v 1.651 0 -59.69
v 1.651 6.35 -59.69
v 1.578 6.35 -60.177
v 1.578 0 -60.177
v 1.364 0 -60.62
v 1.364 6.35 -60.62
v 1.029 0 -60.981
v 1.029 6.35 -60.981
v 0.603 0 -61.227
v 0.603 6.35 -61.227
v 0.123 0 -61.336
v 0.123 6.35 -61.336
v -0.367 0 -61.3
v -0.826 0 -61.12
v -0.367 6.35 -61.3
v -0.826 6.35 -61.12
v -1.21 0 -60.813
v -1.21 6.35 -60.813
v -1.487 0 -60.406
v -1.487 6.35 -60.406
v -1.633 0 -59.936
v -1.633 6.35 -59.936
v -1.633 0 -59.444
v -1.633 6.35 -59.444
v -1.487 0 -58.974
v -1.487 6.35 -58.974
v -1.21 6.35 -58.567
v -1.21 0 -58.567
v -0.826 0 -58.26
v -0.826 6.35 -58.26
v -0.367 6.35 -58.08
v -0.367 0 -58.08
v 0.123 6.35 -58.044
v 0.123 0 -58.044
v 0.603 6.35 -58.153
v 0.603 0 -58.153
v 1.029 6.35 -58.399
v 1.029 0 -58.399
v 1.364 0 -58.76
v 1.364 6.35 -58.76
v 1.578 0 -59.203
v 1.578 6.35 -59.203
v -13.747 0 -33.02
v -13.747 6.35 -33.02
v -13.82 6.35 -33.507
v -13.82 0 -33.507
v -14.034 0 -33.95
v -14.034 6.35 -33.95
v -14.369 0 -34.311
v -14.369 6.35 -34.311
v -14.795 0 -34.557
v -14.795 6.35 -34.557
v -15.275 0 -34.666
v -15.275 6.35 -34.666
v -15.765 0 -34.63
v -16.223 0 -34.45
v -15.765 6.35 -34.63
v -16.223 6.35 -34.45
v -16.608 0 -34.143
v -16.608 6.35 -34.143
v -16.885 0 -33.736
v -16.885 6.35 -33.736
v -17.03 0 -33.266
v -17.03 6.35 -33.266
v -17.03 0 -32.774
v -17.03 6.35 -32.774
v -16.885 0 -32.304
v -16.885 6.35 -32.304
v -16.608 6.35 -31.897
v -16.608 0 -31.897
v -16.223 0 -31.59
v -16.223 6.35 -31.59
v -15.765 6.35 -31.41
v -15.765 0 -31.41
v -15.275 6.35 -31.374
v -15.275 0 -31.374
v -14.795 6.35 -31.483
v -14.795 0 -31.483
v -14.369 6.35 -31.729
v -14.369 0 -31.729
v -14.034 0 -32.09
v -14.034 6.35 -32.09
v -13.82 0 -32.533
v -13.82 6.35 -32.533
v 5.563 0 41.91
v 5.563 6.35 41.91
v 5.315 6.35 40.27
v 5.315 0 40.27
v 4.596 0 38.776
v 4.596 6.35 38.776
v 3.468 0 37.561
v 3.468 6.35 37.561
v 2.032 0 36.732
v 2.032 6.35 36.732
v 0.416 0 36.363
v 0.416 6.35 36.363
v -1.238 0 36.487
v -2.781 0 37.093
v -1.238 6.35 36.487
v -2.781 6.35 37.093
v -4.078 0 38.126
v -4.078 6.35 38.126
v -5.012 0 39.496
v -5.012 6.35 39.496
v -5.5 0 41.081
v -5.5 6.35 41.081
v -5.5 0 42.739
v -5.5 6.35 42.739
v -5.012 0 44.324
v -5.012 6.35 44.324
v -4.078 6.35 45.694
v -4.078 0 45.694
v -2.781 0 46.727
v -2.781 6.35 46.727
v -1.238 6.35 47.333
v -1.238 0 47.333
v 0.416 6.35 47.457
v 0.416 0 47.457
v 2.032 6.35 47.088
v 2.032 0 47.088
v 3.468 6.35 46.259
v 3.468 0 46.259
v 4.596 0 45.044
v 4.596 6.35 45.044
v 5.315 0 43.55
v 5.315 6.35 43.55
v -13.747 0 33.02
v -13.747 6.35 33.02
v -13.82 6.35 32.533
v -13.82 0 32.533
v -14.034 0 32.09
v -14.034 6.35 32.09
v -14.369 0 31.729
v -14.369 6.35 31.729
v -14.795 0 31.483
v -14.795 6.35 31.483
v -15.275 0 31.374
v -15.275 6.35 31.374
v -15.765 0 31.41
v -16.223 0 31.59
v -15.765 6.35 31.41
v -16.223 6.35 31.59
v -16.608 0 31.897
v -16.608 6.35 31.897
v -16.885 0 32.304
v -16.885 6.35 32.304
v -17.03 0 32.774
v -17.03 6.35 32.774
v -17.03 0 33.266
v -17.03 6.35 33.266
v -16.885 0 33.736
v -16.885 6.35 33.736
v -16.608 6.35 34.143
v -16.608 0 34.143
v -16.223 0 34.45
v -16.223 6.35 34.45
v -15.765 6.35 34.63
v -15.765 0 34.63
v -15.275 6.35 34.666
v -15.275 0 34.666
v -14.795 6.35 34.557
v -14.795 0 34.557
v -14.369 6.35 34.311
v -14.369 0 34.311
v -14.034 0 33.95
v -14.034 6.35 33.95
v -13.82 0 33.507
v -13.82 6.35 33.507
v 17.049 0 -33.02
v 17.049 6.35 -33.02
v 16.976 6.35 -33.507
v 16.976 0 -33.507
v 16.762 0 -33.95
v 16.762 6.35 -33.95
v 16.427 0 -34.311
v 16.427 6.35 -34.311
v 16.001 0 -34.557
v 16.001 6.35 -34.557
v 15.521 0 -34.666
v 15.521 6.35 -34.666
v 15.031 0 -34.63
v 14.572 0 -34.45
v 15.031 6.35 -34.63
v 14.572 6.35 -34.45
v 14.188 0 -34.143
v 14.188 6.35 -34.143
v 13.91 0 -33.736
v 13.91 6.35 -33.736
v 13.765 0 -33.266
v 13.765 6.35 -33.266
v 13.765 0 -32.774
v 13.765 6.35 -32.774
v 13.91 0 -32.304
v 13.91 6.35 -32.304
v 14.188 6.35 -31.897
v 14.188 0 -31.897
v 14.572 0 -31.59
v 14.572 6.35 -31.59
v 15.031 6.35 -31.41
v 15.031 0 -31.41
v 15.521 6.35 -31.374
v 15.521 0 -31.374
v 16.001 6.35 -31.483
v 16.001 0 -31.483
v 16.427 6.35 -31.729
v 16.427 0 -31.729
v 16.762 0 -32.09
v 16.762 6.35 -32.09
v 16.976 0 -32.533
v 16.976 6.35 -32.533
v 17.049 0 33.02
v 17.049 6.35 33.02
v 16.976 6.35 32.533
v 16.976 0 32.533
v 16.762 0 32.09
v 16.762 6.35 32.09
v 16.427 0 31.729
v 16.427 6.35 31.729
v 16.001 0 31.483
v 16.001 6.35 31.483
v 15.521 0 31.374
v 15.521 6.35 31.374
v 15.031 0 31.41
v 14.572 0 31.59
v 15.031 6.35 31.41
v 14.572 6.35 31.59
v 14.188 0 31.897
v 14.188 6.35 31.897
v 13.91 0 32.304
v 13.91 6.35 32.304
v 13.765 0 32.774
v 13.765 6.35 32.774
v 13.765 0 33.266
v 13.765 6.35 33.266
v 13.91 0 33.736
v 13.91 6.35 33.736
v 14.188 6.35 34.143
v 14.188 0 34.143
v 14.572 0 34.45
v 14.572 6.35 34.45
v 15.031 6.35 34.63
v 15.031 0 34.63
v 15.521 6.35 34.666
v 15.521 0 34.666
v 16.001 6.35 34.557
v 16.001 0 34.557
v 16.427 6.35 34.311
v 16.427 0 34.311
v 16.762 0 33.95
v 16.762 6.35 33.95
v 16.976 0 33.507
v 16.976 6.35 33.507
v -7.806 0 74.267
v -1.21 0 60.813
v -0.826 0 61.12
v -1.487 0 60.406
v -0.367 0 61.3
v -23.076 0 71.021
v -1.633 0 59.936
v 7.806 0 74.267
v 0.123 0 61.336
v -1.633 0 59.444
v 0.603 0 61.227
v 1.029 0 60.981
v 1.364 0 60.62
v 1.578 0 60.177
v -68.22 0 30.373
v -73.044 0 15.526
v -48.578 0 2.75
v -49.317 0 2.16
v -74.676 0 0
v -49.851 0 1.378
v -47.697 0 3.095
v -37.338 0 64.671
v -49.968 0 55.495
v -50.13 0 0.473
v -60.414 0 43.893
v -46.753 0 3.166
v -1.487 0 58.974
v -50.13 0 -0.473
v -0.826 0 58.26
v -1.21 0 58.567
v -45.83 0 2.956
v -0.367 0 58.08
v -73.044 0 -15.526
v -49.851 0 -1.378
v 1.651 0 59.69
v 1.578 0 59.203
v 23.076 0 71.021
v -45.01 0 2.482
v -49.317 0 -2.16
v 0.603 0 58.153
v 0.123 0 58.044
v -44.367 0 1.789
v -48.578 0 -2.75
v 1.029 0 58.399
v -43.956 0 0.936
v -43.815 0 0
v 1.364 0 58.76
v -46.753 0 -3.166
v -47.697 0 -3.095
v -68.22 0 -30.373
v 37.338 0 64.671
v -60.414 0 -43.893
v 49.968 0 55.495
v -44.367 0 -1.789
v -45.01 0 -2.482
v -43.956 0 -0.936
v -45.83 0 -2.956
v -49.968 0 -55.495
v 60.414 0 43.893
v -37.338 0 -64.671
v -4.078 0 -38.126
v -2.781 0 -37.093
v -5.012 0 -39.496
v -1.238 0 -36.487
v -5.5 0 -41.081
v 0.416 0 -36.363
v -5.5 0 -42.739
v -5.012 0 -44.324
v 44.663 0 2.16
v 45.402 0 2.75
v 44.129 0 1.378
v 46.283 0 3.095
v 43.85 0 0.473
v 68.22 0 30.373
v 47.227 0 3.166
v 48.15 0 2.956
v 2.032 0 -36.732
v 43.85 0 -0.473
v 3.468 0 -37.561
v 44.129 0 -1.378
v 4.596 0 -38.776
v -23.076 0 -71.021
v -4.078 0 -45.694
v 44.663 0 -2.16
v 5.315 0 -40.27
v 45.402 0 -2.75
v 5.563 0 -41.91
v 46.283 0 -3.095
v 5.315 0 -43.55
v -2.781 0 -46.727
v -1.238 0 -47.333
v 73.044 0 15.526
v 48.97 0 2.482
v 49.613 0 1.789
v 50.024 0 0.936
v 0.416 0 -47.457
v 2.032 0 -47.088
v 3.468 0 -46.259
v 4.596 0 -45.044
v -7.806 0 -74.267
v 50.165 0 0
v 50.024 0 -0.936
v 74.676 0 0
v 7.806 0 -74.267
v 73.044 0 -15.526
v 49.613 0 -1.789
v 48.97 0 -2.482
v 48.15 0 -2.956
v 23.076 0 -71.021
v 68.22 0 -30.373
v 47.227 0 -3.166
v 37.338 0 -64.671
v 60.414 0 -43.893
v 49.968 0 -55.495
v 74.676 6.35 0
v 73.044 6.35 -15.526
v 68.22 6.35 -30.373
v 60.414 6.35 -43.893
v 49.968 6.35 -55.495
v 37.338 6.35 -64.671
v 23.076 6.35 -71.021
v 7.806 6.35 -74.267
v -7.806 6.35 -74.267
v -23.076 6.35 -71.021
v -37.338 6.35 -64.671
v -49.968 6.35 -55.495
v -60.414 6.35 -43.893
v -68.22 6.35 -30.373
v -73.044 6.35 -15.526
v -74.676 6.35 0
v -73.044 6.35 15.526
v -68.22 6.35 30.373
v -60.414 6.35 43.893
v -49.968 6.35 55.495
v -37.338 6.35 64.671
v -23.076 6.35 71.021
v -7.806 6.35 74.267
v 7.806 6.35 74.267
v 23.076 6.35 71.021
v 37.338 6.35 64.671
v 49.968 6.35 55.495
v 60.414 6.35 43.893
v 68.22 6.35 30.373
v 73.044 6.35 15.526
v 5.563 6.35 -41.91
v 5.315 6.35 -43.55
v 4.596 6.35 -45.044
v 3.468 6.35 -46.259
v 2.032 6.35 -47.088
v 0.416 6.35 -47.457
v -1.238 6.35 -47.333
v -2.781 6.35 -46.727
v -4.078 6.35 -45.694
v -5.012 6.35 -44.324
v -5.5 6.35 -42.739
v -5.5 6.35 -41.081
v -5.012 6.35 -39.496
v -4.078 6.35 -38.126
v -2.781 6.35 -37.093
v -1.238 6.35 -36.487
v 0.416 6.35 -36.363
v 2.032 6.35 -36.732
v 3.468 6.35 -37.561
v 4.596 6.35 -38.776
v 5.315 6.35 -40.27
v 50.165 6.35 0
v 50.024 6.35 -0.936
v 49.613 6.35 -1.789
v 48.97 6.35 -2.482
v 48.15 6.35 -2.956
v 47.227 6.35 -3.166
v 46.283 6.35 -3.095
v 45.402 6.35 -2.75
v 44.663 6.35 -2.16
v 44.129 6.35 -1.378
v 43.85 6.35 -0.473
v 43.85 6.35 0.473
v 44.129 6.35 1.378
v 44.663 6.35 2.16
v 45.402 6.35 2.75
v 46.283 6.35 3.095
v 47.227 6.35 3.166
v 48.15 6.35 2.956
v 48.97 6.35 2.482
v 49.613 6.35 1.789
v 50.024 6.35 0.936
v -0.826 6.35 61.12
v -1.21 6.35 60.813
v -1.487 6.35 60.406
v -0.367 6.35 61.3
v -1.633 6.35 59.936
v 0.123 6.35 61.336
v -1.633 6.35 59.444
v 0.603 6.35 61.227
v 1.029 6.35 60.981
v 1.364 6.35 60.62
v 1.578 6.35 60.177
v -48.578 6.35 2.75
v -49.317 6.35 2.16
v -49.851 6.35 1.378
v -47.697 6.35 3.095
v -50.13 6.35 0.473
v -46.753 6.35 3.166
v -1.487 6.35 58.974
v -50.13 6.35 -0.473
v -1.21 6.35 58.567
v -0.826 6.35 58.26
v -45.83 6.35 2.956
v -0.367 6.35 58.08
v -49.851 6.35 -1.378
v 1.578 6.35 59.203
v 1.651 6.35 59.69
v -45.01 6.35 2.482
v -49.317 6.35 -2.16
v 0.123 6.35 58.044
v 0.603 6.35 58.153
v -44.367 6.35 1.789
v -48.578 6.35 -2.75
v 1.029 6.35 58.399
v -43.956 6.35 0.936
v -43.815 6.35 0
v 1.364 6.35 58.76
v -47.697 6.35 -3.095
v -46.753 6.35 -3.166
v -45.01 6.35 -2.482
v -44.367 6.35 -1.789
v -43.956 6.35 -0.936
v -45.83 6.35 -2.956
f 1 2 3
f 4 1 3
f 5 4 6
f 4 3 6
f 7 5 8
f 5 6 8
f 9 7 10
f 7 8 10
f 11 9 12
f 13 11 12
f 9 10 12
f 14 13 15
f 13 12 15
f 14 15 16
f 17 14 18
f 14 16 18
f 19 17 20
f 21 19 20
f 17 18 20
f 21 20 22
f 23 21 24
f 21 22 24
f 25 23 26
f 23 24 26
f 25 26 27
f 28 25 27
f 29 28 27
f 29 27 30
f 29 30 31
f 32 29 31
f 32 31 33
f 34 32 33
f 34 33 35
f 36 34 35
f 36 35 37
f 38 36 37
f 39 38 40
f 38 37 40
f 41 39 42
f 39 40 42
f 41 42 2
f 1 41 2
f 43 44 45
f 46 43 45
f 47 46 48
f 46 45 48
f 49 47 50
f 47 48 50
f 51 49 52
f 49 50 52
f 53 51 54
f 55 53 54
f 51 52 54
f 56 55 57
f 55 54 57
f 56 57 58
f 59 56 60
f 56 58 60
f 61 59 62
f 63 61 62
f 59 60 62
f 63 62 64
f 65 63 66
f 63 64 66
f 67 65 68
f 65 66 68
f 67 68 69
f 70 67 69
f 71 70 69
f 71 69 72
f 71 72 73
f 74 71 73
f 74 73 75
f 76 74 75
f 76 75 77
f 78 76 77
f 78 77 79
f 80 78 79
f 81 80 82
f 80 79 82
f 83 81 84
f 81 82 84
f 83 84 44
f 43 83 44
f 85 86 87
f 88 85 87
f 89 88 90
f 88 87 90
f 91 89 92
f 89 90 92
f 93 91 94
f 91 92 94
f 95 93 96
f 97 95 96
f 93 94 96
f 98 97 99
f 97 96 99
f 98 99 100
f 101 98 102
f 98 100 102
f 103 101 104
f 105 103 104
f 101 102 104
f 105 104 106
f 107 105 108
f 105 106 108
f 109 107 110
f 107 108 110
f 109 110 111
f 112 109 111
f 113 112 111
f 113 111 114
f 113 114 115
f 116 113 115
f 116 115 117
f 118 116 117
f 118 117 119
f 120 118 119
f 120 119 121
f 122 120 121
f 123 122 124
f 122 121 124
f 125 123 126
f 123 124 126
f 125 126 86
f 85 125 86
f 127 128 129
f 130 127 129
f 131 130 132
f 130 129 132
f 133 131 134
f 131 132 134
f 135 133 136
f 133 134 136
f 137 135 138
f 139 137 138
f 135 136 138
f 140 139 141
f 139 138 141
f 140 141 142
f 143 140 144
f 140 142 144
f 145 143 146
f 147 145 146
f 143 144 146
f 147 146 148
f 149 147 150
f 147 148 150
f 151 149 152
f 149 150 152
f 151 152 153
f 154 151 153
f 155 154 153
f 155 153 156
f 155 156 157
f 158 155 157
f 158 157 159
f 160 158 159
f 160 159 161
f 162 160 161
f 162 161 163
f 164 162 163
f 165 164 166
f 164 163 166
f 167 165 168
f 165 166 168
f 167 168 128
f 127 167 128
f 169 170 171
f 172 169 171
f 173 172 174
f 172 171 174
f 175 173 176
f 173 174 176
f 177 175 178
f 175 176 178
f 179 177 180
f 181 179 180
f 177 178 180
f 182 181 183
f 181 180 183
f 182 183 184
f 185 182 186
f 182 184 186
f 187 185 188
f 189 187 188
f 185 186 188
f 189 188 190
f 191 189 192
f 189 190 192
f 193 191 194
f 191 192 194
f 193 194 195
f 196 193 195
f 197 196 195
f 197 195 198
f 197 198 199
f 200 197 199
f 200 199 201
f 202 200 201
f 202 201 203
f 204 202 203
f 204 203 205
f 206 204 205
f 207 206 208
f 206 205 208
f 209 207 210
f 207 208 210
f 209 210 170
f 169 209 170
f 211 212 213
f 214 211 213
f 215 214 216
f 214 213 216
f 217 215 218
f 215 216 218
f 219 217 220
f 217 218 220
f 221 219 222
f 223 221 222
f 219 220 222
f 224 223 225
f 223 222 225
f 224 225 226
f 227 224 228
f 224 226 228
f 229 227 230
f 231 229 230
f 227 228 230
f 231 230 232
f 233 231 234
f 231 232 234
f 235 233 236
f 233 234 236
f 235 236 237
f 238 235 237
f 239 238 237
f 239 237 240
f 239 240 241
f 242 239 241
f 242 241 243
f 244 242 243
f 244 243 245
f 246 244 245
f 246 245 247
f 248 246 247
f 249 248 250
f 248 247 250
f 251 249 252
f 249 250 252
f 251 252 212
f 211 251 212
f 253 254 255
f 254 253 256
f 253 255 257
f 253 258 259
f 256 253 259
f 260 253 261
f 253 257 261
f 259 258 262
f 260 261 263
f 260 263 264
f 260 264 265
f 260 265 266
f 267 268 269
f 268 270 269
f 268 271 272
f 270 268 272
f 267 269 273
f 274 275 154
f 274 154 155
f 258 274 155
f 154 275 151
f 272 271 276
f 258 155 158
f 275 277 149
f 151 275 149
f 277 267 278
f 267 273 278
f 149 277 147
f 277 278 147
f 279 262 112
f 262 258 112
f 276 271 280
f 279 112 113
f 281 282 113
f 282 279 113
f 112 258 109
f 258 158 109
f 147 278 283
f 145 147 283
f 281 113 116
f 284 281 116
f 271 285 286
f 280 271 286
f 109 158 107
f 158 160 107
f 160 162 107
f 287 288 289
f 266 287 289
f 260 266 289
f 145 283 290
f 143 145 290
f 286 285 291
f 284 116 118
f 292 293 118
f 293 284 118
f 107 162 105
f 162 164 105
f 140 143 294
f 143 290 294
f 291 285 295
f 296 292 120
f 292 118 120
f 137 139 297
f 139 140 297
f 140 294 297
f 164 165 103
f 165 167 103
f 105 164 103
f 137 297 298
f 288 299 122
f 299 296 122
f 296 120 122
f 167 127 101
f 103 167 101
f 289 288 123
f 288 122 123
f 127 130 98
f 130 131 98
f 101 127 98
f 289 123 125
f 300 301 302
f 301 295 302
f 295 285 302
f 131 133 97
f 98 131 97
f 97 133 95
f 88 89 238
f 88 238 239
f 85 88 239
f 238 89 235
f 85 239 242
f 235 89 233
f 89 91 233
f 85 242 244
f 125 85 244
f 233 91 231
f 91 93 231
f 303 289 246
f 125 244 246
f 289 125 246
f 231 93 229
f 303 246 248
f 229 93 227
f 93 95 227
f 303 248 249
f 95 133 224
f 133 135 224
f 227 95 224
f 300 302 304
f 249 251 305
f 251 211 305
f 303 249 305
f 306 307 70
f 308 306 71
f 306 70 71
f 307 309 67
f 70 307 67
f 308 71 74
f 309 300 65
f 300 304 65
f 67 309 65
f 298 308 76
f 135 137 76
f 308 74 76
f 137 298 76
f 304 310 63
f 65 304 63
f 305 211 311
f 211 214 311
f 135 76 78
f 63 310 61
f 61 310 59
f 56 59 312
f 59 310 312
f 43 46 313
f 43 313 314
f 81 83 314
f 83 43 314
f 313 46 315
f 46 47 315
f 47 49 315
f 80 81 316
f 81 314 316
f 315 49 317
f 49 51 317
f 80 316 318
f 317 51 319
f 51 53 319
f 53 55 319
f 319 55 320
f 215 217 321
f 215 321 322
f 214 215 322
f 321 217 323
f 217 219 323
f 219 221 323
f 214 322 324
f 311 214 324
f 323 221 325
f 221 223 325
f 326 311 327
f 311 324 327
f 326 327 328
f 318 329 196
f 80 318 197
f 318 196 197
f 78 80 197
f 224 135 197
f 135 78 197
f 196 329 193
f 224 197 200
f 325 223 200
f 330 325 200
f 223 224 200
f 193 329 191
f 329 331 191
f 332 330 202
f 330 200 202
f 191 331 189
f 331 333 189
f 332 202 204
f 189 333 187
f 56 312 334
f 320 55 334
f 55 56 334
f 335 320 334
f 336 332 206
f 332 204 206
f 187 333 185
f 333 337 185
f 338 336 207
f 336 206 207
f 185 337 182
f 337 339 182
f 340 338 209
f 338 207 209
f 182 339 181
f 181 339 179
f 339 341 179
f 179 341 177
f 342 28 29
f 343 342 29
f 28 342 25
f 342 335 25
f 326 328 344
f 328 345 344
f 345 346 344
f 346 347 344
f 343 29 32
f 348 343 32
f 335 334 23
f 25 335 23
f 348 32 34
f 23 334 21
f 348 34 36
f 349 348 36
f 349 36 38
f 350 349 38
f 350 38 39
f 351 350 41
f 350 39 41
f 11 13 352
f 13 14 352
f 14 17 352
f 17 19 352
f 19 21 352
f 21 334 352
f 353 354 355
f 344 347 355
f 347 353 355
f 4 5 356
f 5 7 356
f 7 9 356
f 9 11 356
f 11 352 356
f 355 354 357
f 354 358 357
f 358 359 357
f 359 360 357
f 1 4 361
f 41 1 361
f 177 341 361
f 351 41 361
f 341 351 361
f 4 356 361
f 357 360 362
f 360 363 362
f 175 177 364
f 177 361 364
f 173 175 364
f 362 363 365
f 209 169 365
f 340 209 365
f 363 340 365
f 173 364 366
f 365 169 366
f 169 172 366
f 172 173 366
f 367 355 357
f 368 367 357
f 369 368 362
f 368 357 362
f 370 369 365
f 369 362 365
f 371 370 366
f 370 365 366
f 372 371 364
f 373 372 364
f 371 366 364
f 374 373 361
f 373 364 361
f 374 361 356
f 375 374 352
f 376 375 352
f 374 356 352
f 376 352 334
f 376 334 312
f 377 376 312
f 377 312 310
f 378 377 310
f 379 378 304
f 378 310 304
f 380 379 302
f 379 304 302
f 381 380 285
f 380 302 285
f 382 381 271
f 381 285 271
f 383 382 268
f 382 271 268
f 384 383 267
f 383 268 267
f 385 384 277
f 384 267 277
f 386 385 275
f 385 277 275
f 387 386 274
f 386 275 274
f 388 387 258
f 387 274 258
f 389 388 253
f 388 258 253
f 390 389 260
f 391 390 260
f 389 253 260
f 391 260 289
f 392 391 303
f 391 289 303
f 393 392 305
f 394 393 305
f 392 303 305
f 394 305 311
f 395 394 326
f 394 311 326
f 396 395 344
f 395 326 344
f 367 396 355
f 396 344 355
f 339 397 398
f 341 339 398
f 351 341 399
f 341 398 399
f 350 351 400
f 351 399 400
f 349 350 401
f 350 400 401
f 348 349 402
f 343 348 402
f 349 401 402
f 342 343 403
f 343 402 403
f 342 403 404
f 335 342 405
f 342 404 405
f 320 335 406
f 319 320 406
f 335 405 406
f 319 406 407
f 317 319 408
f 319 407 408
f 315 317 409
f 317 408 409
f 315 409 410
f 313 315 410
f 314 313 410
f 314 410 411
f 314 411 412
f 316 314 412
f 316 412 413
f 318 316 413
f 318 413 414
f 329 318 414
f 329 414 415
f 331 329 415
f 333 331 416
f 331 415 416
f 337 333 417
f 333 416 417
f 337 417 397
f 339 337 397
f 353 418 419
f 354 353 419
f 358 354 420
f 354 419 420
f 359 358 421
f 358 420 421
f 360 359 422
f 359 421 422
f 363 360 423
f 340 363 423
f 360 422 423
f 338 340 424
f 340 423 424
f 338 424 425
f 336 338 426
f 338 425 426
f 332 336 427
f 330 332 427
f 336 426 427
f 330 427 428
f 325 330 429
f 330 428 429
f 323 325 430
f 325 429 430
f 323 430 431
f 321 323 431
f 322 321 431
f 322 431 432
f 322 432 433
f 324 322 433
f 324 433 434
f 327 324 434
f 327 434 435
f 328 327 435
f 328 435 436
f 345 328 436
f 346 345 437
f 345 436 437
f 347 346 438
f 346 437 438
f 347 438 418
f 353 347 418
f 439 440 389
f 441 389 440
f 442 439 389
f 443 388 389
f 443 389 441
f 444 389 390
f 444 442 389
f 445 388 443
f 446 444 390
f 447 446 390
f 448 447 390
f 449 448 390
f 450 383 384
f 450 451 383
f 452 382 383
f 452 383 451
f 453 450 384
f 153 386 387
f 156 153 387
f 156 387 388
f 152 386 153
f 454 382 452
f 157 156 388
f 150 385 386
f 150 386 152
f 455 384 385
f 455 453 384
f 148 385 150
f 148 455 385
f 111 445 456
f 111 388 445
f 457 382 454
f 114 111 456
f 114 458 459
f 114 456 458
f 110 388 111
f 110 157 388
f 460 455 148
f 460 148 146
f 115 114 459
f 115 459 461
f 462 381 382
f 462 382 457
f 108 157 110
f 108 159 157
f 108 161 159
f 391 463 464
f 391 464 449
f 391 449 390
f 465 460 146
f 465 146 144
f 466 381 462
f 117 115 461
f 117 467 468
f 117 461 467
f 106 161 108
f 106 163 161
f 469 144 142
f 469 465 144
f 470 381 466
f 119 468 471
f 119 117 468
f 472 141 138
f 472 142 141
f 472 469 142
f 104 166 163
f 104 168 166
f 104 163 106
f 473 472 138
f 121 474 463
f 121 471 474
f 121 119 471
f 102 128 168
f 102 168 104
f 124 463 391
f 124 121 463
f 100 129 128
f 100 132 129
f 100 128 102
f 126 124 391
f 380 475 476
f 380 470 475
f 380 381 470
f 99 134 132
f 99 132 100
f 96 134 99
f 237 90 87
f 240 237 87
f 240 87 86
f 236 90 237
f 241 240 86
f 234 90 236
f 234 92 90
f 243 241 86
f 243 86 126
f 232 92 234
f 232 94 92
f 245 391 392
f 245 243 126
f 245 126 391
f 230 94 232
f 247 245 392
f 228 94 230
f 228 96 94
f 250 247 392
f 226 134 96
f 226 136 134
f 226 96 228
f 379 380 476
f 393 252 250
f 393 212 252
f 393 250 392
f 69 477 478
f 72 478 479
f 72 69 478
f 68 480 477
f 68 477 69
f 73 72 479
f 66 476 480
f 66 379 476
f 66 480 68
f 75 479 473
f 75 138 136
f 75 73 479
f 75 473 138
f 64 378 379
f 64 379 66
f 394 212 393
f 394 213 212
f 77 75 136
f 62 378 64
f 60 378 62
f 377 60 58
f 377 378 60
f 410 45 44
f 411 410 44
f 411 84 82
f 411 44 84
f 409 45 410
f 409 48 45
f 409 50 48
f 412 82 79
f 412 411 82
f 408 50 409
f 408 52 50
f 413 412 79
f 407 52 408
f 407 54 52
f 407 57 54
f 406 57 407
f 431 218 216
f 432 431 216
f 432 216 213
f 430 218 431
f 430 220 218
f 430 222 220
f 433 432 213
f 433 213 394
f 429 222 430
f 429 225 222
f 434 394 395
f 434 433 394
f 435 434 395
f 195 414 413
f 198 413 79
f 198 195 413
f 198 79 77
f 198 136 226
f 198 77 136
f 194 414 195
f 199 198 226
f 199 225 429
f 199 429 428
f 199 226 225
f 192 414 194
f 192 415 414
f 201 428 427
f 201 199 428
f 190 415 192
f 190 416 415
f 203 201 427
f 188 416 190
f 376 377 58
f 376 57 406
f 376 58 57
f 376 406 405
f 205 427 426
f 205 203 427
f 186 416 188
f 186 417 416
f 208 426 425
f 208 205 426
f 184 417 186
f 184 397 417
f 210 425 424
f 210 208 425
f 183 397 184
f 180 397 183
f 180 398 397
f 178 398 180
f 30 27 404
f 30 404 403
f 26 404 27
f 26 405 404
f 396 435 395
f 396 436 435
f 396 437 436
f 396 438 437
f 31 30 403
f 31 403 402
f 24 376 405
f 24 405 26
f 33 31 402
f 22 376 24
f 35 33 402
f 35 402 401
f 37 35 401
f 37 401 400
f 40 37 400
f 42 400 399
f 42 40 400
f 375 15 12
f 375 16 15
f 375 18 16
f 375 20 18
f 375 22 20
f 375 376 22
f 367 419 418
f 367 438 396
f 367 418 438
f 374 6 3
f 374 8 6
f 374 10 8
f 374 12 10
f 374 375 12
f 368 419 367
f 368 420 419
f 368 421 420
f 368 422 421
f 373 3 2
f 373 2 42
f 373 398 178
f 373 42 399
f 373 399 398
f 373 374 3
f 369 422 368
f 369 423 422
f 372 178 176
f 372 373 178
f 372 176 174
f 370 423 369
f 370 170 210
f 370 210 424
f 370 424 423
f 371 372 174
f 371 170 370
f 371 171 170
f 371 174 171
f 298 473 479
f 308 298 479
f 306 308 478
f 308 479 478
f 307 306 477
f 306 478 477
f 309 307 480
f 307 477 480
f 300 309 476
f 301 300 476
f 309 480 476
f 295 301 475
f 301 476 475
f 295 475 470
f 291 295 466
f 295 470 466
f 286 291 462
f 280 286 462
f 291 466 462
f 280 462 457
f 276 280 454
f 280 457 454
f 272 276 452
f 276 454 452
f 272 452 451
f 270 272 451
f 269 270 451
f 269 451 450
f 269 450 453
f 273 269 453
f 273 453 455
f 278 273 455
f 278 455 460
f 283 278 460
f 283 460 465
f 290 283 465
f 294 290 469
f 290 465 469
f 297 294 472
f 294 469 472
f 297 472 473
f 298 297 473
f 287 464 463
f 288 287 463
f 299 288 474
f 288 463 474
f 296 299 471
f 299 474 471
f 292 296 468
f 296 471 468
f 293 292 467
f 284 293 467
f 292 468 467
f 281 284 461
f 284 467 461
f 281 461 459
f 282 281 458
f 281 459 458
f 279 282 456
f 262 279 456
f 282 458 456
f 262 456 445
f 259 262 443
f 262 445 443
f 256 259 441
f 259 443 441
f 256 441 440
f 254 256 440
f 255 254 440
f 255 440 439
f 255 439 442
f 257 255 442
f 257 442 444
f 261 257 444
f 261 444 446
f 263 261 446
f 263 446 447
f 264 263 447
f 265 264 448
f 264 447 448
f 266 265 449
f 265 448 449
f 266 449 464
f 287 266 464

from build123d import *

# Parameters (mm, degrees)
SKETCH1_R                  = 74.676
BOSS_EXTRUDE1_DEPTH        = 6.35
SKETCH2_R                  = 1.651
SKETCH2_R_2                = 5.5626
CO2EJEC_FLANGE_HOLES_DEPTH = 6.35
SKETCH3_R                  = 3.175
F_1_4_HOLES_DEPTH          = 6.35


with BuildPart() as part:
    # Sketch1 → Boss-Extrude1 (new body)
    with BuildSketch(Plane(origin=(0, 0, 0), x_dir=(1, 0, 0), z_dir=(0, 1, 0))):
        Circle(SKETCH1_R)
    extrude(amount=BOSS_EXTRUDE1_DEPTH)

    # Sketch2 → CO2Ejec_Flange_Holes (cut)
    with BuildSketch(Plane(origin=(0, 6.35, 0), x_dir=(1, 0, 0), z_dir=(0, 1, 0))):
        with Locations((15.397931679, 33.02)):
            Circle(SKETCH2_R)
        with Locations((0, 41.91)):
            Circle(SKETCH2_R_2)
        with Locations((0, 59.69)):
            Circle(SKETCH2_R)
        with Locations((-15.397931679, 33.02)):
            Circle(SKETCH2_R)
        with Locations((0, -59.69)):
            Circle(SKETCH2_R)
        with Locations((-15.397931679, -33.02)):
            Circle(SKETCH2_R)
        with Locations((0, -41.91)):
            Circle(SKETCH2_R_2)
        with Locations((15.397931679, -33.02)):
            Circle(SKETCH2_R)
    extrude(amount=-CO2EJEC_FLANGE_HOLES_DEPTH, mode=Mode.SUBTRACT)

    # Sketch3 → 1/4 Holes (cut)
    with BuildSketch(Plane(origin=(0, 6.35, 0), x_dir=(1, 0, 0), z_dir=(0, 1, 0))):
        with Locations((-46.99, 0)):
            Circle(SKETCH3_R)
        with Locations((46.99, 0)):
            Circle(SKETCH3_R)
    extrude(amount=-F_1_4_HOLES_DEPTH, mode=Mode.SUBTRACT)


solid = part.part
